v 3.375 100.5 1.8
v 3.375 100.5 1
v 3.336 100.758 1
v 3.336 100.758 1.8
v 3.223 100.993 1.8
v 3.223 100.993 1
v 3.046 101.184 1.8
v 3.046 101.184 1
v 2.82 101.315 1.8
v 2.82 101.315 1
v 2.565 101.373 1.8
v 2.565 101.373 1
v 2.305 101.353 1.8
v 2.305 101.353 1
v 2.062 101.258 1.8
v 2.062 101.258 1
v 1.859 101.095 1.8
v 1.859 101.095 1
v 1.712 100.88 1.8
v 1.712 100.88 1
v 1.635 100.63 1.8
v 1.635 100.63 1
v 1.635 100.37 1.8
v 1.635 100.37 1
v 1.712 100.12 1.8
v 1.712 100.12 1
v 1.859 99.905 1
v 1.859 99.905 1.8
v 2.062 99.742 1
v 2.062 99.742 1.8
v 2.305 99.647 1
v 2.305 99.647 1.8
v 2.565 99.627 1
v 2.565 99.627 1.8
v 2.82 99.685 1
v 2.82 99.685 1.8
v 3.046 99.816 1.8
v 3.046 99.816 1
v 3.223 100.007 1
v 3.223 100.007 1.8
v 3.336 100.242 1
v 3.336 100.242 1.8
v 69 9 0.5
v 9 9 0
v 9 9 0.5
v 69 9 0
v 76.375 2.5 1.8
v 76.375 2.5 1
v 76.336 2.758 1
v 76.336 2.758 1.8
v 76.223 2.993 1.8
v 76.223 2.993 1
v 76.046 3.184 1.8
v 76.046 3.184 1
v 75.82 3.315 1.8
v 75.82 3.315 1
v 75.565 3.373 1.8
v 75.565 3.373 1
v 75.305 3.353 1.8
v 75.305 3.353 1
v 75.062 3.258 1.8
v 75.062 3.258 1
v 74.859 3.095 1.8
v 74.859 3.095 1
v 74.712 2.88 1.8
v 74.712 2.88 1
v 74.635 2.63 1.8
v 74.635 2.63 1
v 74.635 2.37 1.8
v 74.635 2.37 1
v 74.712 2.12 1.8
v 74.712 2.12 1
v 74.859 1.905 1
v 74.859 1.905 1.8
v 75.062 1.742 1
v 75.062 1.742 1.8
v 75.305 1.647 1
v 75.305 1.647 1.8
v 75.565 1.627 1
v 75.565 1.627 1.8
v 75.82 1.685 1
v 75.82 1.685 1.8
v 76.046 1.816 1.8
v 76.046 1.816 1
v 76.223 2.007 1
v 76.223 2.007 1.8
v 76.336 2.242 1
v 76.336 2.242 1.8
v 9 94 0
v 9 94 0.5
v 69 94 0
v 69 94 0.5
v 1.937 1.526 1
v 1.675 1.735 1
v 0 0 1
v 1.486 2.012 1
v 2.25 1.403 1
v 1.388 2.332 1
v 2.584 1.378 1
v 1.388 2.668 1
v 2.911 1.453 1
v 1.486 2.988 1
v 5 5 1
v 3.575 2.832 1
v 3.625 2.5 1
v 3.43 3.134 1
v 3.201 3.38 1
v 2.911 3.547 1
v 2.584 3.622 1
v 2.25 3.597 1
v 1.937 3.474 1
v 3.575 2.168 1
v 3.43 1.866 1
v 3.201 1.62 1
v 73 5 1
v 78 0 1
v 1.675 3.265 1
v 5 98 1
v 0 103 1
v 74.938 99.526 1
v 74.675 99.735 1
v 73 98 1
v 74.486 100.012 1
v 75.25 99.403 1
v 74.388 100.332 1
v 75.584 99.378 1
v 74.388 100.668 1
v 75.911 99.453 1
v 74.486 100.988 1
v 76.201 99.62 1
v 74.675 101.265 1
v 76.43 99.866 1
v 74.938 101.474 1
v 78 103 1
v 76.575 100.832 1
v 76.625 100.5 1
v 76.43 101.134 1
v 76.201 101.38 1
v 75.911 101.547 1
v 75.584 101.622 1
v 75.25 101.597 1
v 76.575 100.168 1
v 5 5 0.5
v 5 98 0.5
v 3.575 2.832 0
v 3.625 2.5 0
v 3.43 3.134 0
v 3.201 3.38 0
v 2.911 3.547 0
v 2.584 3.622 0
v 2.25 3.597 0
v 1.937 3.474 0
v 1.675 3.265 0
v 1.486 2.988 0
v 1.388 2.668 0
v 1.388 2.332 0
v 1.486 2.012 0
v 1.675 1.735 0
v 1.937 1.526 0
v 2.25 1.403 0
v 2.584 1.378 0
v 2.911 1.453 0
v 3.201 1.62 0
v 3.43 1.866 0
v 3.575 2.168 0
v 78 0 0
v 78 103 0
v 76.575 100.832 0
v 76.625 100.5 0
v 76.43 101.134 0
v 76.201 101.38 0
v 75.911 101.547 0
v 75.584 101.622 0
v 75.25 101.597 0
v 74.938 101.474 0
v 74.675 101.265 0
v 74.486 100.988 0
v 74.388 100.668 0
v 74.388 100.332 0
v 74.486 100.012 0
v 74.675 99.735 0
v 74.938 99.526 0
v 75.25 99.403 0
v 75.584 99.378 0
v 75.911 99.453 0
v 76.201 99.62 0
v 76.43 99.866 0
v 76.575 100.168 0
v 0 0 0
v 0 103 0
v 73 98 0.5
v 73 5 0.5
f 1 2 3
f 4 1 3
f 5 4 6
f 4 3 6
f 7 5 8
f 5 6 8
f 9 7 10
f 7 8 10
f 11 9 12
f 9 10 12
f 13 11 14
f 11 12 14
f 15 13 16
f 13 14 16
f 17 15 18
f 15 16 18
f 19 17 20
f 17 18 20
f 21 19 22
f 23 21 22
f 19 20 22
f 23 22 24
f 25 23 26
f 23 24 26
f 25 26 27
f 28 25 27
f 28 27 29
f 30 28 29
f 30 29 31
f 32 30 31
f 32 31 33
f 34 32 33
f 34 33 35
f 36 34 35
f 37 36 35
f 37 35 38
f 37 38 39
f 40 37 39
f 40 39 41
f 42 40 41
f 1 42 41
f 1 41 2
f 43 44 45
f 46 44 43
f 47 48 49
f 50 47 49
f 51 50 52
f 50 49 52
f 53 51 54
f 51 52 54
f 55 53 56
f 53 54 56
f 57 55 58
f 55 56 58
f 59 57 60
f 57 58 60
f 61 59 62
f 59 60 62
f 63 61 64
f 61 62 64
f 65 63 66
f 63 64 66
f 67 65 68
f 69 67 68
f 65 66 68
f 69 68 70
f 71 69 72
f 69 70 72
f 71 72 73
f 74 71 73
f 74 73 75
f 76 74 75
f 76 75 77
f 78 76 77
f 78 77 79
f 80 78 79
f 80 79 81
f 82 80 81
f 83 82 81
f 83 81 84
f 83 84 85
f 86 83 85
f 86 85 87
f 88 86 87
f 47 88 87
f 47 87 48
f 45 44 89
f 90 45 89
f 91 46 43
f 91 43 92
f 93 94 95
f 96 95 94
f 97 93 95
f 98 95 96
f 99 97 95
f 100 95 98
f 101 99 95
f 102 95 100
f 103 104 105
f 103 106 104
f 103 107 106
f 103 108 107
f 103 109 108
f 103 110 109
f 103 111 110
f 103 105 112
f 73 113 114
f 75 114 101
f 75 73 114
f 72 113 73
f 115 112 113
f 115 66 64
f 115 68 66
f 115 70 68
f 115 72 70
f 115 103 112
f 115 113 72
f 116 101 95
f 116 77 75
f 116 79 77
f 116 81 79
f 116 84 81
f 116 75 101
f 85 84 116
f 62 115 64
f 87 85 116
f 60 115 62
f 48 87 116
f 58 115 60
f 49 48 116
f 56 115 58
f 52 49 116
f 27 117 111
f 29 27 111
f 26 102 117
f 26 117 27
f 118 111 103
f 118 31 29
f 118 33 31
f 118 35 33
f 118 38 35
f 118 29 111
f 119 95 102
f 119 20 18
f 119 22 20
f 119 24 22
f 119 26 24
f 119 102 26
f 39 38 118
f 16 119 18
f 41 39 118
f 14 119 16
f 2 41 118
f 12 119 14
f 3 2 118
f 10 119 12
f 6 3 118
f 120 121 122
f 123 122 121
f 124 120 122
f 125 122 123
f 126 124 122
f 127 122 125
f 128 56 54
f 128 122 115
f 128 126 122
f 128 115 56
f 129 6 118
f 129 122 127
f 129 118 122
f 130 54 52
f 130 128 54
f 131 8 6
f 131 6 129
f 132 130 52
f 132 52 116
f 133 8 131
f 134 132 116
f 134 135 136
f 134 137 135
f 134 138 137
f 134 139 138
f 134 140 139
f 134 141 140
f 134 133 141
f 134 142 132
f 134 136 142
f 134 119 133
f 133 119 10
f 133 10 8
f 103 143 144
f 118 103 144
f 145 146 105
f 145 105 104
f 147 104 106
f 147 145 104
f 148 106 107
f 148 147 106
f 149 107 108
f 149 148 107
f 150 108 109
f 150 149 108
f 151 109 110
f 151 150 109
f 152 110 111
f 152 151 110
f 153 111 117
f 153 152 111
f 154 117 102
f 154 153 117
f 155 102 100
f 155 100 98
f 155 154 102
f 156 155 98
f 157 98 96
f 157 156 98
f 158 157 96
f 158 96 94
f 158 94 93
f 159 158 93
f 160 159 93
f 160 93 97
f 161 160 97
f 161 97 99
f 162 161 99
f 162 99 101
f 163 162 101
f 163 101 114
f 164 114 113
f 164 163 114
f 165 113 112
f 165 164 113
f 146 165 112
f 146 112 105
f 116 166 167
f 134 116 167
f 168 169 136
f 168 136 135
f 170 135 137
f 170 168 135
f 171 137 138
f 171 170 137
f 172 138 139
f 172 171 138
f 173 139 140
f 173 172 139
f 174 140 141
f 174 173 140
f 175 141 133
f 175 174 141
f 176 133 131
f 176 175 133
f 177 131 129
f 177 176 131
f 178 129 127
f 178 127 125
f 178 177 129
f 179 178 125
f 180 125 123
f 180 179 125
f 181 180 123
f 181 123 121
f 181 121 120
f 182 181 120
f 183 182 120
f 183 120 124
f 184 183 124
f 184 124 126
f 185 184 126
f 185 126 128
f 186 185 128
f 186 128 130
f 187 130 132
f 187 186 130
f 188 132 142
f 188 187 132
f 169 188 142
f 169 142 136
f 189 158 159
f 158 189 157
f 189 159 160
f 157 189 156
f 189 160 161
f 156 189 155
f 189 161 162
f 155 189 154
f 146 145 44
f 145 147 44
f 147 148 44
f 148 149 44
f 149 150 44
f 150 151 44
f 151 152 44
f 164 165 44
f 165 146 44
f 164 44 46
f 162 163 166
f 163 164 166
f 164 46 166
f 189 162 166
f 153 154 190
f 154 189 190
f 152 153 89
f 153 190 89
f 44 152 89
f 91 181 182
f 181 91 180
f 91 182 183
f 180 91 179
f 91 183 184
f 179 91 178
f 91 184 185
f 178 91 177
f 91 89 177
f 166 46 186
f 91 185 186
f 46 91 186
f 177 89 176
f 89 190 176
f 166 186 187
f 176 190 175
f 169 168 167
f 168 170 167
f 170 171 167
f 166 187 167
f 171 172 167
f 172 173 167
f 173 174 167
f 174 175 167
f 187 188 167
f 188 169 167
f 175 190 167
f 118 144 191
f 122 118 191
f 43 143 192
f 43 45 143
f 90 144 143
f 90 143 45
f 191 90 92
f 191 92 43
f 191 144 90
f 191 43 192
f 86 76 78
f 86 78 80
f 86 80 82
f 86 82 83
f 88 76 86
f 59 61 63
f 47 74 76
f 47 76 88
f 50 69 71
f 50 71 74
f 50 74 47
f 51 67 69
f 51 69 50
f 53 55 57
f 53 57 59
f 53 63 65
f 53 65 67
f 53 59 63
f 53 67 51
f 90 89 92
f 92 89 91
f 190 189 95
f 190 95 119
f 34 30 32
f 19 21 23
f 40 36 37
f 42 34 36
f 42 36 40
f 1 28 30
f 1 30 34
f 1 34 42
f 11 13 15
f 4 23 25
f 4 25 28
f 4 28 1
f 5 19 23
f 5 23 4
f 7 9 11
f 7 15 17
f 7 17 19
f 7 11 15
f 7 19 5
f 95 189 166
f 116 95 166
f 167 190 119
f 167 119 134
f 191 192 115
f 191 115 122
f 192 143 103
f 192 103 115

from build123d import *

# Parameters (mm, degrees)
F0_W     = 68
F0_H     = 93
F0_W_2   = 60
F0_H_2   = 85
F1_DEPTH = 0.5
F0_W_3   = 78
F0_H_3   = 103
F0_R     = 1.125
F0_R_2   = 0.875
F2_DEPTH = 1
F3_DEPTH = 1.8


with BuildPart() as f1:
    # F0 (on Top) → F1 (new body)
    with BuildSketch(Plane.XY):
        with Locations((39, 51.5)):
            Rectangle(F0_W, F0_H)
        with Locations((39, 51.5)):
            Rectangle(F0_W_2, F0_H_2, mode=Mode.SUBTRACT)
    extrude(amount=F1_DEPTH)

    # F0 (on Top) → F2 (join)
    with BuildSketch(Plane.XY):
        with Locations((39, 51.5)):
            Rectangle(F0_W_3, F0_H_3)
        with Locations((2.5, 2.5)):
            Circle(F0_R, mode=Mode.SUBTRACT)
        with Locations((75.5, 2.5)):
            Circle(F0_R_2, mode=Mode.SUBTRACT)
        with Locations((39, 51.5)):
            Rectangle(F0_W, F0_H, mode=Mode.SUBTRACT)
        with Locations((2.5, 100.5)):
            Circle(F0_R_2, mode=Mode.SUBTRACT)
        with Locations((75.5, 100.5)):
            Circle(F0_R, mode=Mode.SUBTRACT)
    extrude(amount=F2_DEPTH)

    # F0 (on Top) → F3 (join)
    with BuildSketch(Plane.XY):
        with Locations((75.5, 2.5)):
            Circle(F0_R_2)
        with Locations((2.5, 100.5)):
            Circle(F0_R_2)
    extrude(amount=F3_DEPTH)


solid = f1.part
